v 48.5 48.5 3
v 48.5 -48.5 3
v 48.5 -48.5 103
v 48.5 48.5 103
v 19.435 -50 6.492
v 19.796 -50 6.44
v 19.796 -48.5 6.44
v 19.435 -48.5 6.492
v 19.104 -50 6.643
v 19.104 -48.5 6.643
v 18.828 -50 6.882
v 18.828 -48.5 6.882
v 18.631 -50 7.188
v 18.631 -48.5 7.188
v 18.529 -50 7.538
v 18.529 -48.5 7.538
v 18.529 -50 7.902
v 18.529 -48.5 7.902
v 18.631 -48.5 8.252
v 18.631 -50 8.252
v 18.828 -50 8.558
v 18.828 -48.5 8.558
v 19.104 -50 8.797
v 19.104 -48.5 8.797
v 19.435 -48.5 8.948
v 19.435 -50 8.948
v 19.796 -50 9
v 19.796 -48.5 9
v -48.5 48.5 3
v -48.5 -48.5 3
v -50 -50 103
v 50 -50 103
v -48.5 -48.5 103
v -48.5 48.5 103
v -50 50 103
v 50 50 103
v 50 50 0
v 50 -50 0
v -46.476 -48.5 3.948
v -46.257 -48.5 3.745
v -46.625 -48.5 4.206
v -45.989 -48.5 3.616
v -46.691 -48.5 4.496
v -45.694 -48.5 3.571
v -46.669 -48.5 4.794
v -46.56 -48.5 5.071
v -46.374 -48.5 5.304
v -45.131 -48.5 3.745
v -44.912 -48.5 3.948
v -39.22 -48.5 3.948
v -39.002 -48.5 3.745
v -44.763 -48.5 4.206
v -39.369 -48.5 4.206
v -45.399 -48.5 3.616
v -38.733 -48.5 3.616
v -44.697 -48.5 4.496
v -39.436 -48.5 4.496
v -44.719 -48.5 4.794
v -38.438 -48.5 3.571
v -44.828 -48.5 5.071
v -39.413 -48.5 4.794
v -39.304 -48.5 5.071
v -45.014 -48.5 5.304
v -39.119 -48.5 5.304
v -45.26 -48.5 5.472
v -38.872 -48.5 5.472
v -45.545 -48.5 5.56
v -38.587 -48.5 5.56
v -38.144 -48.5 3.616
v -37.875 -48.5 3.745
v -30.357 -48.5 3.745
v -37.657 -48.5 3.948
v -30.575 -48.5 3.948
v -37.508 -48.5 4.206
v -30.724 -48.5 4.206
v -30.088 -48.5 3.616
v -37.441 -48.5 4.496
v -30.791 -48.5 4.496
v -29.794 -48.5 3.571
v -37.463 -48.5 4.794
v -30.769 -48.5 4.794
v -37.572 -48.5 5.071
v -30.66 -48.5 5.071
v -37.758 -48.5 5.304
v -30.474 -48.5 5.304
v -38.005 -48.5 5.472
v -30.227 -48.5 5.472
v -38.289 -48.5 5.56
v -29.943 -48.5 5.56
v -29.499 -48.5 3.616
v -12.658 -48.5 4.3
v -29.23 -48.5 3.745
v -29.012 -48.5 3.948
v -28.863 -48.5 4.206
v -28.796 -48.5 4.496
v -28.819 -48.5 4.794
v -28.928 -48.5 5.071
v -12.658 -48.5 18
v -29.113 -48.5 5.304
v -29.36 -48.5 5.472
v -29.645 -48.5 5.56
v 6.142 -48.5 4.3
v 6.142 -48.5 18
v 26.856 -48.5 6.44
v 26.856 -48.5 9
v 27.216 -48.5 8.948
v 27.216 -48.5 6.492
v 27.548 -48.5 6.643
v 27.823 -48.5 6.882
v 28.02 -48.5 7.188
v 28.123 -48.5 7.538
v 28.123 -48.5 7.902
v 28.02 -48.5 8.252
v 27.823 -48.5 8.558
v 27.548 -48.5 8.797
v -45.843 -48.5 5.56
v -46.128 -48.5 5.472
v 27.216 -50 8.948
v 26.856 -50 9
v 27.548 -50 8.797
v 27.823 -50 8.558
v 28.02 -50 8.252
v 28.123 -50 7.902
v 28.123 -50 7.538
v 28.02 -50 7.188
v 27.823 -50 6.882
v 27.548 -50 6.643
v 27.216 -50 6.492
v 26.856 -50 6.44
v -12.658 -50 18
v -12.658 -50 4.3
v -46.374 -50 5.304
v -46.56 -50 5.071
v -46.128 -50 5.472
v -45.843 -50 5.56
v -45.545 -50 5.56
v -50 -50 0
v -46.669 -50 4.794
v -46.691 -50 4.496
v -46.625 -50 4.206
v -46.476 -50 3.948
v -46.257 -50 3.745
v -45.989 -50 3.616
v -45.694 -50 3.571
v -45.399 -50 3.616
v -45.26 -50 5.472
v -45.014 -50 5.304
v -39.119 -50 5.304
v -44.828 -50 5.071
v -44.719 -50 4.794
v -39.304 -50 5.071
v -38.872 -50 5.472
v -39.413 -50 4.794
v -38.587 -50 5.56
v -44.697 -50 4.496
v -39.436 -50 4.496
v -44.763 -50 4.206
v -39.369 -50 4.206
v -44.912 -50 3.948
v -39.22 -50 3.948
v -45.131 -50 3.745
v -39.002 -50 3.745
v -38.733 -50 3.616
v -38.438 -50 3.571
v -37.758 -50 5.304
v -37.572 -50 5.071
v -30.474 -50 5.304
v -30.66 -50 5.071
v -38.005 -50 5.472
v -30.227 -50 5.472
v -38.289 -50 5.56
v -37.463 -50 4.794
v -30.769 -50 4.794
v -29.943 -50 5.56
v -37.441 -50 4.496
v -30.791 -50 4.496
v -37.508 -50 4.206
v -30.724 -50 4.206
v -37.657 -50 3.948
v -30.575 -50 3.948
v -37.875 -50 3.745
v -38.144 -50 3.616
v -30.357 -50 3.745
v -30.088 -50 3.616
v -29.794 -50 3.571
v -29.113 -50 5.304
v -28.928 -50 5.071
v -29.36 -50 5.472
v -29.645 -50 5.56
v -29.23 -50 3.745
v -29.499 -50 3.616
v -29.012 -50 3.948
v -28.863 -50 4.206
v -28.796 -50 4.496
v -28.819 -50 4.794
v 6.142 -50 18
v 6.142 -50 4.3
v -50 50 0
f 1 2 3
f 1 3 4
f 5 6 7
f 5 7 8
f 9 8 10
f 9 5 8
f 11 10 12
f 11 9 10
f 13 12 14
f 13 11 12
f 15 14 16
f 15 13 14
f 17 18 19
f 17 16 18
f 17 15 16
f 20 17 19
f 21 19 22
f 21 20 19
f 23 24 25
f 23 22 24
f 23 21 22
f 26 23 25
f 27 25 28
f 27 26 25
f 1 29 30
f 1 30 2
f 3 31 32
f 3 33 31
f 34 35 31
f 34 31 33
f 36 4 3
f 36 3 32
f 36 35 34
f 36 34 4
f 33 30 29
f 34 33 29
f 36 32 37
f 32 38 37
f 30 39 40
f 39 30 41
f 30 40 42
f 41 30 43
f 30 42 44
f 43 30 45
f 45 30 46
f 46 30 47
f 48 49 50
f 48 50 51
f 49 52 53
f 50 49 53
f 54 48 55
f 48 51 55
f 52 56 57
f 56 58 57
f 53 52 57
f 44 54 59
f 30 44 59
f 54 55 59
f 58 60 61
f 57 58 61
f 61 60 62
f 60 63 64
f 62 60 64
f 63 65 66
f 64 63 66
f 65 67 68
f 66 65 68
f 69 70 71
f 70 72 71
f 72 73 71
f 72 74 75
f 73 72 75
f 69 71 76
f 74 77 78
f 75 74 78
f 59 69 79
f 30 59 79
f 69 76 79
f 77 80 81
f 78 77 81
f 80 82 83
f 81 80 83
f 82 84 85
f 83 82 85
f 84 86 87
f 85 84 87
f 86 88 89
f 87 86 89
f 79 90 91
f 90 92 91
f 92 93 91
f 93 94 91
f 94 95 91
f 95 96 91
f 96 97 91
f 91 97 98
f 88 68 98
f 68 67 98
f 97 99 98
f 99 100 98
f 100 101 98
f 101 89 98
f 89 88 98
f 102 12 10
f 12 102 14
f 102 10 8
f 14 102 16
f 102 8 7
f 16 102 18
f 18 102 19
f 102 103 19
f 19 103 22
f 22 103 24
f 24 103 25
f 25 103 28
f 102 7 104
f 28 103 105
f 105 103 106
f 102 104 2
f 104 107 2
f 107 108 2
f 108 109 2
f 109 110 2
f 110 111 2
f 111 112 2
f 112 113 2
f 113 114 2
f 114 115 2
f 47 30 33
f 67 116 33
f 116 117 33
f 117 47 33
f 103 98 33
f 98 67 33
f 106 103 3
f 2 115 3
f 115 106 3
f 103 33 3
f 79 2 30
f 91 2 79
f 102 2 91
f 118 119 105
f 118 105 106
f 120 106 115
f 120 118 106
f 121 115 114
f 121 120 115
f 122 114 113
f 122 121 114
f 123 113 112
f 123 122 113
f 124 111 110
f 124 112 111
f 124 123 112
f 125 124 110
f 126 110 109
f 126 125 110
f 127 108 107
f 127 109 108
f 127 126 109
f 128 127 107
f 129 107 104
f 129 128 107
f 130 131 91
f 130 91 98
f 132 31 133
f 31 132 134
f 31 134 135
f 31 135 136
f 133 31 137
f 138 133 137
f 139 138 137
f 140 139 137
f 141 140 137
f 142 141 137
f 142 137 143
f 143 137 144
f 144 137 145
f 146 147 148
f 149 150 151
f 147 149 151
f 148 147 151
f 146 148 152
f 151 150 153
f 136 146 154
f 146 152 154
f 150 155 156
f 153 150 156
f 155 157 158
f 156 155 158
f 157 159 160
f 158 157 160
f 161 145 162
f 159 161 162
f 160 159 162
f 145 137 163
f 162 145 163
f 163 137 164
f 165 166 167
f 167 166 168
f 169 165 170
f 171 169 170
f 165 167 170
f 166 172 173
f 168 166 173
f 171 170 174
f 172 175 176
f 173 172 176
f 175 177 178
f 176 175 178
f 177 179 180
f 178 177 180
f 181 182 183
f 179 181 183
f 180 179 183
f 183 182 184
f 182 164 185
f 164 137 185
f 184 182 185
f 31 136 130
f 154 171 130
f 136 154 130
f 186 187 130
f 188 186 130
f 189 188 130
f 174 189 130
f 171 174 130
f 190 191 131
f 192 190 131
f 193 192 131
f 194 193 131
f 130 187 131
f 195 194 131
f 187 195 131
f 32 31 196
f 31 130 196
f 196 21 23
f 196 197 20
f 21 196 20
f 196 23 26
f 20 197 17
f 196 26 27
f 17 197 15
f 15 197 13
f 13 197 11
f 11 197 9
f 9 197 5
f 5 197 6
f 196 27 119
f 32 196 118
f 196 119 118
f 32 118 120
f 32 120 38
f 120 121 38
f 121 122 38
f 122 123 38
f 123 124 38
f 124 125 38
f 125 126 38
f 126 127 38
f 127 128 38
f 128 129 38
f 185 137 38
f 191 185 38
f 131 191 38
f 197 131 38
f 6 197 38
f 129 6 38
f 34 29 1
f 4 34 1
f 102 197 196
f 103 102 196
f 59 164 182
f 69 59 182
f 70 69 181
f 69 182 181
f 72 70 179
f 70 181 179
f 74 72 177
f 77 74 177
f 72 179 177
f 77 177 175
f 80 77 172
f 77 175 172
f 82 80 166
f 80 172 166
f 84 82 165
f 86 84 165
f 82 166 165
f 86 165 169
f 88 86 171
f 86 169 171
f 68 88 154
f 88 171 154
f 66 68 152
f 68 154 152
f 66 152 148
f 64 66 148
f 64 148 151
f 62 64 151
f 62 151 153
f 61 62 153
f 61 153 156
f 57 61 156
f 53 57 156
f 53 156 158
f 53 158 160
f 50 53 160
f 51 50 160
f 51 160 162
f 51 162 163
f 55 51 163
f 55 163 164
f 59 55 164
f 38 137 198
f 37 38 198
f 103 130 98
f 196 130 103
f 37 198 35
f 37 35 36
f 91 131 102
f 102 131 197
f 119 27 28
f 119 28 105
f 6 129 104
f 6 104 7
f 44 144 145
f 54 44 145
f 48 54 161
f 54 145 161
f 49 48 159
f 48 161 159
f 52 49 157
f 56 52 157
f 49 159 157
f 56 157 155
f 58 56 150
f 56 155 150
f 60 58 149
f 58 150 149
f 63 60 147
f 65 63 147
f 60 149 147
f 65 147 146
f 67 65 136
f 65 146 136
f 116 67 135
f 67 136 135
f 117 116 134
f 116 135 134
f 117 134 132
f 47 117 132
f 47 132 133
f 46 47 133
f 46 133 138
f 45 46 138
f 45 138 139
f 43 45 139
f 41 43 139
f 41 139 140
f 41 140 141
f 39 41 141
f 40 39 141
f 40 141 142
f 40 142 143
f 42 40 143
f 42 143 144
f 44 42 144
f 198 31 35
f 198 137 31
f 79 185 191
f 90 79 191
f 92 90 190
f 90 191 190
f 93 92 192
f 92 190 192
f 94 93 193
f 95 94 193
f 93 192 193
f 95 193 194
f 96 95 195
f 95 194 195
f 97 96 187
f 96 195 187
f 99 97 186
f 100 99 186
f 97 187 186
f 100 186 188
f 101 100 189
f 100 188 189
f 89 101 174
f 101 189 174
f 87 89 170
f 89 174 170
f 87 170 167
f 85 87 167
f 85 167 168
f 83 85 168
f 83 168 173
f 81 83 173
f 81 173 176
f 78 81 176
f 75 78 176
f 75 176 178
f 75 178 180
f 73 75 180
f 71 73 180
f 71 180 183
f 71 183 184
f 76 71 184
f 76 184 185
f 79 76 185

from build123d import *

# Parameters (mm, degrees)
SKETCH1_W           = 100
SKETCH1_H           = 100
BOSS_EXTRUDE1_DEPTH = 3
SKETCH4_W           = 100
SKETCH4_H           = 100
BOSS_EXTRUDE2_DEPTH = 100
SKETCH5_W           = 97
SKETCH5_H           = 97
CUT_EXTRUDE1_DEPTH  = 100
SKETCH6_R           = 1
CUT_EXTRUDE2_DEPTH  = 3
SKETCH7_W           = 18.8
SKETCH7_H           = 13.7
CUT_EXTRUDE3_DEPTH  = 3
CUT_EXTRUDE4_DEPTH  = 3


with BuildPart() as part:
    # Sketch1 → Boss-Extrude1 (new body)
    with BuildSketch(Plane(origin=(0, 0, 0), x_dir=(0, 1, 0), z_dir=(0, 0, 1))):
        Rectangle(SKETCH1_W, SKETCH1_H)
    extrude(amount=BOSS_EXTRUDE1_DEPTH)

    # Sketch4 → Boss-Extrude2 (add)
    with BuildSketch(Plane.XY.offset(3)):
        Rectangle(SKETCH4_W, SKETCH4_H)
    extrude(amount=BOSS_EXTRUDE2_DEPTH)

    # Sketch5 → Cut-Extrude1 (cut)
    with BuildSketch(Plane.XY.offset(103)):
        Rectangle(SKETCH5_W, SKETCH5_H)
    extrude(amount=-CUT_EXTRUDE1_DEPTH, mode=Mode.SUBTRACT)

    # Sketch6 → Cut-Extrude2 (cut)
    with BuildSketch(Plane.XZ.offset(50)):
        with Locations(Location((-45.693823315, 4.571208487, 0), (0, 0, 270))):
            Circle(SKETCH6_R)
        with Locations(Location((-38.438385154, 4.571208487, 0), (0, 0, 270))):
            Circle(SKETCH6_R)
        with Locations(Location((-29.79360777, 4.571208487, 0), (0, 0, 270))):
            Circle(SKETCH6_R)
    extrude(amount=-CUT_EXTRUDE2_DEPTH, mode=Mode.SUBTRACT)

    # Sketch7 → Cut-Extrude3 (cut)
    with BuildSketch(Plane.XZ.offset(50)):
        with Locations((-3.258424026, 11.15)):
            Rectangle(SKETCH7_W, SKETCH7_H)
    extrude(amount=-CUT_EXTRUDE3_DEPTH, mode=Mode.SUBTRACT)

    # Sketch8 → Cut-Extrude4 (cut)
    with BuildSketch(Plane.XZ.offset(50)):
        with BuildLine():
            Line((19.795752189, 9), (26.855752189, 9))
            ThreePointArc((26.855752189, 9), (28.135752189, 7.72), (26.855752189, 6.44))
            Line((26.855752189, 6.44), (19.795752189, 6.44))
            ThreePointArc((19.795752189, 6.44), (18.515752189, 7.72), (19.795752189, 9))
        make_face()
    extrude(amount=-CUT_EXTRUDE4_DEPTH, mode=Mode.SUBTRACT)


solid = part.part
